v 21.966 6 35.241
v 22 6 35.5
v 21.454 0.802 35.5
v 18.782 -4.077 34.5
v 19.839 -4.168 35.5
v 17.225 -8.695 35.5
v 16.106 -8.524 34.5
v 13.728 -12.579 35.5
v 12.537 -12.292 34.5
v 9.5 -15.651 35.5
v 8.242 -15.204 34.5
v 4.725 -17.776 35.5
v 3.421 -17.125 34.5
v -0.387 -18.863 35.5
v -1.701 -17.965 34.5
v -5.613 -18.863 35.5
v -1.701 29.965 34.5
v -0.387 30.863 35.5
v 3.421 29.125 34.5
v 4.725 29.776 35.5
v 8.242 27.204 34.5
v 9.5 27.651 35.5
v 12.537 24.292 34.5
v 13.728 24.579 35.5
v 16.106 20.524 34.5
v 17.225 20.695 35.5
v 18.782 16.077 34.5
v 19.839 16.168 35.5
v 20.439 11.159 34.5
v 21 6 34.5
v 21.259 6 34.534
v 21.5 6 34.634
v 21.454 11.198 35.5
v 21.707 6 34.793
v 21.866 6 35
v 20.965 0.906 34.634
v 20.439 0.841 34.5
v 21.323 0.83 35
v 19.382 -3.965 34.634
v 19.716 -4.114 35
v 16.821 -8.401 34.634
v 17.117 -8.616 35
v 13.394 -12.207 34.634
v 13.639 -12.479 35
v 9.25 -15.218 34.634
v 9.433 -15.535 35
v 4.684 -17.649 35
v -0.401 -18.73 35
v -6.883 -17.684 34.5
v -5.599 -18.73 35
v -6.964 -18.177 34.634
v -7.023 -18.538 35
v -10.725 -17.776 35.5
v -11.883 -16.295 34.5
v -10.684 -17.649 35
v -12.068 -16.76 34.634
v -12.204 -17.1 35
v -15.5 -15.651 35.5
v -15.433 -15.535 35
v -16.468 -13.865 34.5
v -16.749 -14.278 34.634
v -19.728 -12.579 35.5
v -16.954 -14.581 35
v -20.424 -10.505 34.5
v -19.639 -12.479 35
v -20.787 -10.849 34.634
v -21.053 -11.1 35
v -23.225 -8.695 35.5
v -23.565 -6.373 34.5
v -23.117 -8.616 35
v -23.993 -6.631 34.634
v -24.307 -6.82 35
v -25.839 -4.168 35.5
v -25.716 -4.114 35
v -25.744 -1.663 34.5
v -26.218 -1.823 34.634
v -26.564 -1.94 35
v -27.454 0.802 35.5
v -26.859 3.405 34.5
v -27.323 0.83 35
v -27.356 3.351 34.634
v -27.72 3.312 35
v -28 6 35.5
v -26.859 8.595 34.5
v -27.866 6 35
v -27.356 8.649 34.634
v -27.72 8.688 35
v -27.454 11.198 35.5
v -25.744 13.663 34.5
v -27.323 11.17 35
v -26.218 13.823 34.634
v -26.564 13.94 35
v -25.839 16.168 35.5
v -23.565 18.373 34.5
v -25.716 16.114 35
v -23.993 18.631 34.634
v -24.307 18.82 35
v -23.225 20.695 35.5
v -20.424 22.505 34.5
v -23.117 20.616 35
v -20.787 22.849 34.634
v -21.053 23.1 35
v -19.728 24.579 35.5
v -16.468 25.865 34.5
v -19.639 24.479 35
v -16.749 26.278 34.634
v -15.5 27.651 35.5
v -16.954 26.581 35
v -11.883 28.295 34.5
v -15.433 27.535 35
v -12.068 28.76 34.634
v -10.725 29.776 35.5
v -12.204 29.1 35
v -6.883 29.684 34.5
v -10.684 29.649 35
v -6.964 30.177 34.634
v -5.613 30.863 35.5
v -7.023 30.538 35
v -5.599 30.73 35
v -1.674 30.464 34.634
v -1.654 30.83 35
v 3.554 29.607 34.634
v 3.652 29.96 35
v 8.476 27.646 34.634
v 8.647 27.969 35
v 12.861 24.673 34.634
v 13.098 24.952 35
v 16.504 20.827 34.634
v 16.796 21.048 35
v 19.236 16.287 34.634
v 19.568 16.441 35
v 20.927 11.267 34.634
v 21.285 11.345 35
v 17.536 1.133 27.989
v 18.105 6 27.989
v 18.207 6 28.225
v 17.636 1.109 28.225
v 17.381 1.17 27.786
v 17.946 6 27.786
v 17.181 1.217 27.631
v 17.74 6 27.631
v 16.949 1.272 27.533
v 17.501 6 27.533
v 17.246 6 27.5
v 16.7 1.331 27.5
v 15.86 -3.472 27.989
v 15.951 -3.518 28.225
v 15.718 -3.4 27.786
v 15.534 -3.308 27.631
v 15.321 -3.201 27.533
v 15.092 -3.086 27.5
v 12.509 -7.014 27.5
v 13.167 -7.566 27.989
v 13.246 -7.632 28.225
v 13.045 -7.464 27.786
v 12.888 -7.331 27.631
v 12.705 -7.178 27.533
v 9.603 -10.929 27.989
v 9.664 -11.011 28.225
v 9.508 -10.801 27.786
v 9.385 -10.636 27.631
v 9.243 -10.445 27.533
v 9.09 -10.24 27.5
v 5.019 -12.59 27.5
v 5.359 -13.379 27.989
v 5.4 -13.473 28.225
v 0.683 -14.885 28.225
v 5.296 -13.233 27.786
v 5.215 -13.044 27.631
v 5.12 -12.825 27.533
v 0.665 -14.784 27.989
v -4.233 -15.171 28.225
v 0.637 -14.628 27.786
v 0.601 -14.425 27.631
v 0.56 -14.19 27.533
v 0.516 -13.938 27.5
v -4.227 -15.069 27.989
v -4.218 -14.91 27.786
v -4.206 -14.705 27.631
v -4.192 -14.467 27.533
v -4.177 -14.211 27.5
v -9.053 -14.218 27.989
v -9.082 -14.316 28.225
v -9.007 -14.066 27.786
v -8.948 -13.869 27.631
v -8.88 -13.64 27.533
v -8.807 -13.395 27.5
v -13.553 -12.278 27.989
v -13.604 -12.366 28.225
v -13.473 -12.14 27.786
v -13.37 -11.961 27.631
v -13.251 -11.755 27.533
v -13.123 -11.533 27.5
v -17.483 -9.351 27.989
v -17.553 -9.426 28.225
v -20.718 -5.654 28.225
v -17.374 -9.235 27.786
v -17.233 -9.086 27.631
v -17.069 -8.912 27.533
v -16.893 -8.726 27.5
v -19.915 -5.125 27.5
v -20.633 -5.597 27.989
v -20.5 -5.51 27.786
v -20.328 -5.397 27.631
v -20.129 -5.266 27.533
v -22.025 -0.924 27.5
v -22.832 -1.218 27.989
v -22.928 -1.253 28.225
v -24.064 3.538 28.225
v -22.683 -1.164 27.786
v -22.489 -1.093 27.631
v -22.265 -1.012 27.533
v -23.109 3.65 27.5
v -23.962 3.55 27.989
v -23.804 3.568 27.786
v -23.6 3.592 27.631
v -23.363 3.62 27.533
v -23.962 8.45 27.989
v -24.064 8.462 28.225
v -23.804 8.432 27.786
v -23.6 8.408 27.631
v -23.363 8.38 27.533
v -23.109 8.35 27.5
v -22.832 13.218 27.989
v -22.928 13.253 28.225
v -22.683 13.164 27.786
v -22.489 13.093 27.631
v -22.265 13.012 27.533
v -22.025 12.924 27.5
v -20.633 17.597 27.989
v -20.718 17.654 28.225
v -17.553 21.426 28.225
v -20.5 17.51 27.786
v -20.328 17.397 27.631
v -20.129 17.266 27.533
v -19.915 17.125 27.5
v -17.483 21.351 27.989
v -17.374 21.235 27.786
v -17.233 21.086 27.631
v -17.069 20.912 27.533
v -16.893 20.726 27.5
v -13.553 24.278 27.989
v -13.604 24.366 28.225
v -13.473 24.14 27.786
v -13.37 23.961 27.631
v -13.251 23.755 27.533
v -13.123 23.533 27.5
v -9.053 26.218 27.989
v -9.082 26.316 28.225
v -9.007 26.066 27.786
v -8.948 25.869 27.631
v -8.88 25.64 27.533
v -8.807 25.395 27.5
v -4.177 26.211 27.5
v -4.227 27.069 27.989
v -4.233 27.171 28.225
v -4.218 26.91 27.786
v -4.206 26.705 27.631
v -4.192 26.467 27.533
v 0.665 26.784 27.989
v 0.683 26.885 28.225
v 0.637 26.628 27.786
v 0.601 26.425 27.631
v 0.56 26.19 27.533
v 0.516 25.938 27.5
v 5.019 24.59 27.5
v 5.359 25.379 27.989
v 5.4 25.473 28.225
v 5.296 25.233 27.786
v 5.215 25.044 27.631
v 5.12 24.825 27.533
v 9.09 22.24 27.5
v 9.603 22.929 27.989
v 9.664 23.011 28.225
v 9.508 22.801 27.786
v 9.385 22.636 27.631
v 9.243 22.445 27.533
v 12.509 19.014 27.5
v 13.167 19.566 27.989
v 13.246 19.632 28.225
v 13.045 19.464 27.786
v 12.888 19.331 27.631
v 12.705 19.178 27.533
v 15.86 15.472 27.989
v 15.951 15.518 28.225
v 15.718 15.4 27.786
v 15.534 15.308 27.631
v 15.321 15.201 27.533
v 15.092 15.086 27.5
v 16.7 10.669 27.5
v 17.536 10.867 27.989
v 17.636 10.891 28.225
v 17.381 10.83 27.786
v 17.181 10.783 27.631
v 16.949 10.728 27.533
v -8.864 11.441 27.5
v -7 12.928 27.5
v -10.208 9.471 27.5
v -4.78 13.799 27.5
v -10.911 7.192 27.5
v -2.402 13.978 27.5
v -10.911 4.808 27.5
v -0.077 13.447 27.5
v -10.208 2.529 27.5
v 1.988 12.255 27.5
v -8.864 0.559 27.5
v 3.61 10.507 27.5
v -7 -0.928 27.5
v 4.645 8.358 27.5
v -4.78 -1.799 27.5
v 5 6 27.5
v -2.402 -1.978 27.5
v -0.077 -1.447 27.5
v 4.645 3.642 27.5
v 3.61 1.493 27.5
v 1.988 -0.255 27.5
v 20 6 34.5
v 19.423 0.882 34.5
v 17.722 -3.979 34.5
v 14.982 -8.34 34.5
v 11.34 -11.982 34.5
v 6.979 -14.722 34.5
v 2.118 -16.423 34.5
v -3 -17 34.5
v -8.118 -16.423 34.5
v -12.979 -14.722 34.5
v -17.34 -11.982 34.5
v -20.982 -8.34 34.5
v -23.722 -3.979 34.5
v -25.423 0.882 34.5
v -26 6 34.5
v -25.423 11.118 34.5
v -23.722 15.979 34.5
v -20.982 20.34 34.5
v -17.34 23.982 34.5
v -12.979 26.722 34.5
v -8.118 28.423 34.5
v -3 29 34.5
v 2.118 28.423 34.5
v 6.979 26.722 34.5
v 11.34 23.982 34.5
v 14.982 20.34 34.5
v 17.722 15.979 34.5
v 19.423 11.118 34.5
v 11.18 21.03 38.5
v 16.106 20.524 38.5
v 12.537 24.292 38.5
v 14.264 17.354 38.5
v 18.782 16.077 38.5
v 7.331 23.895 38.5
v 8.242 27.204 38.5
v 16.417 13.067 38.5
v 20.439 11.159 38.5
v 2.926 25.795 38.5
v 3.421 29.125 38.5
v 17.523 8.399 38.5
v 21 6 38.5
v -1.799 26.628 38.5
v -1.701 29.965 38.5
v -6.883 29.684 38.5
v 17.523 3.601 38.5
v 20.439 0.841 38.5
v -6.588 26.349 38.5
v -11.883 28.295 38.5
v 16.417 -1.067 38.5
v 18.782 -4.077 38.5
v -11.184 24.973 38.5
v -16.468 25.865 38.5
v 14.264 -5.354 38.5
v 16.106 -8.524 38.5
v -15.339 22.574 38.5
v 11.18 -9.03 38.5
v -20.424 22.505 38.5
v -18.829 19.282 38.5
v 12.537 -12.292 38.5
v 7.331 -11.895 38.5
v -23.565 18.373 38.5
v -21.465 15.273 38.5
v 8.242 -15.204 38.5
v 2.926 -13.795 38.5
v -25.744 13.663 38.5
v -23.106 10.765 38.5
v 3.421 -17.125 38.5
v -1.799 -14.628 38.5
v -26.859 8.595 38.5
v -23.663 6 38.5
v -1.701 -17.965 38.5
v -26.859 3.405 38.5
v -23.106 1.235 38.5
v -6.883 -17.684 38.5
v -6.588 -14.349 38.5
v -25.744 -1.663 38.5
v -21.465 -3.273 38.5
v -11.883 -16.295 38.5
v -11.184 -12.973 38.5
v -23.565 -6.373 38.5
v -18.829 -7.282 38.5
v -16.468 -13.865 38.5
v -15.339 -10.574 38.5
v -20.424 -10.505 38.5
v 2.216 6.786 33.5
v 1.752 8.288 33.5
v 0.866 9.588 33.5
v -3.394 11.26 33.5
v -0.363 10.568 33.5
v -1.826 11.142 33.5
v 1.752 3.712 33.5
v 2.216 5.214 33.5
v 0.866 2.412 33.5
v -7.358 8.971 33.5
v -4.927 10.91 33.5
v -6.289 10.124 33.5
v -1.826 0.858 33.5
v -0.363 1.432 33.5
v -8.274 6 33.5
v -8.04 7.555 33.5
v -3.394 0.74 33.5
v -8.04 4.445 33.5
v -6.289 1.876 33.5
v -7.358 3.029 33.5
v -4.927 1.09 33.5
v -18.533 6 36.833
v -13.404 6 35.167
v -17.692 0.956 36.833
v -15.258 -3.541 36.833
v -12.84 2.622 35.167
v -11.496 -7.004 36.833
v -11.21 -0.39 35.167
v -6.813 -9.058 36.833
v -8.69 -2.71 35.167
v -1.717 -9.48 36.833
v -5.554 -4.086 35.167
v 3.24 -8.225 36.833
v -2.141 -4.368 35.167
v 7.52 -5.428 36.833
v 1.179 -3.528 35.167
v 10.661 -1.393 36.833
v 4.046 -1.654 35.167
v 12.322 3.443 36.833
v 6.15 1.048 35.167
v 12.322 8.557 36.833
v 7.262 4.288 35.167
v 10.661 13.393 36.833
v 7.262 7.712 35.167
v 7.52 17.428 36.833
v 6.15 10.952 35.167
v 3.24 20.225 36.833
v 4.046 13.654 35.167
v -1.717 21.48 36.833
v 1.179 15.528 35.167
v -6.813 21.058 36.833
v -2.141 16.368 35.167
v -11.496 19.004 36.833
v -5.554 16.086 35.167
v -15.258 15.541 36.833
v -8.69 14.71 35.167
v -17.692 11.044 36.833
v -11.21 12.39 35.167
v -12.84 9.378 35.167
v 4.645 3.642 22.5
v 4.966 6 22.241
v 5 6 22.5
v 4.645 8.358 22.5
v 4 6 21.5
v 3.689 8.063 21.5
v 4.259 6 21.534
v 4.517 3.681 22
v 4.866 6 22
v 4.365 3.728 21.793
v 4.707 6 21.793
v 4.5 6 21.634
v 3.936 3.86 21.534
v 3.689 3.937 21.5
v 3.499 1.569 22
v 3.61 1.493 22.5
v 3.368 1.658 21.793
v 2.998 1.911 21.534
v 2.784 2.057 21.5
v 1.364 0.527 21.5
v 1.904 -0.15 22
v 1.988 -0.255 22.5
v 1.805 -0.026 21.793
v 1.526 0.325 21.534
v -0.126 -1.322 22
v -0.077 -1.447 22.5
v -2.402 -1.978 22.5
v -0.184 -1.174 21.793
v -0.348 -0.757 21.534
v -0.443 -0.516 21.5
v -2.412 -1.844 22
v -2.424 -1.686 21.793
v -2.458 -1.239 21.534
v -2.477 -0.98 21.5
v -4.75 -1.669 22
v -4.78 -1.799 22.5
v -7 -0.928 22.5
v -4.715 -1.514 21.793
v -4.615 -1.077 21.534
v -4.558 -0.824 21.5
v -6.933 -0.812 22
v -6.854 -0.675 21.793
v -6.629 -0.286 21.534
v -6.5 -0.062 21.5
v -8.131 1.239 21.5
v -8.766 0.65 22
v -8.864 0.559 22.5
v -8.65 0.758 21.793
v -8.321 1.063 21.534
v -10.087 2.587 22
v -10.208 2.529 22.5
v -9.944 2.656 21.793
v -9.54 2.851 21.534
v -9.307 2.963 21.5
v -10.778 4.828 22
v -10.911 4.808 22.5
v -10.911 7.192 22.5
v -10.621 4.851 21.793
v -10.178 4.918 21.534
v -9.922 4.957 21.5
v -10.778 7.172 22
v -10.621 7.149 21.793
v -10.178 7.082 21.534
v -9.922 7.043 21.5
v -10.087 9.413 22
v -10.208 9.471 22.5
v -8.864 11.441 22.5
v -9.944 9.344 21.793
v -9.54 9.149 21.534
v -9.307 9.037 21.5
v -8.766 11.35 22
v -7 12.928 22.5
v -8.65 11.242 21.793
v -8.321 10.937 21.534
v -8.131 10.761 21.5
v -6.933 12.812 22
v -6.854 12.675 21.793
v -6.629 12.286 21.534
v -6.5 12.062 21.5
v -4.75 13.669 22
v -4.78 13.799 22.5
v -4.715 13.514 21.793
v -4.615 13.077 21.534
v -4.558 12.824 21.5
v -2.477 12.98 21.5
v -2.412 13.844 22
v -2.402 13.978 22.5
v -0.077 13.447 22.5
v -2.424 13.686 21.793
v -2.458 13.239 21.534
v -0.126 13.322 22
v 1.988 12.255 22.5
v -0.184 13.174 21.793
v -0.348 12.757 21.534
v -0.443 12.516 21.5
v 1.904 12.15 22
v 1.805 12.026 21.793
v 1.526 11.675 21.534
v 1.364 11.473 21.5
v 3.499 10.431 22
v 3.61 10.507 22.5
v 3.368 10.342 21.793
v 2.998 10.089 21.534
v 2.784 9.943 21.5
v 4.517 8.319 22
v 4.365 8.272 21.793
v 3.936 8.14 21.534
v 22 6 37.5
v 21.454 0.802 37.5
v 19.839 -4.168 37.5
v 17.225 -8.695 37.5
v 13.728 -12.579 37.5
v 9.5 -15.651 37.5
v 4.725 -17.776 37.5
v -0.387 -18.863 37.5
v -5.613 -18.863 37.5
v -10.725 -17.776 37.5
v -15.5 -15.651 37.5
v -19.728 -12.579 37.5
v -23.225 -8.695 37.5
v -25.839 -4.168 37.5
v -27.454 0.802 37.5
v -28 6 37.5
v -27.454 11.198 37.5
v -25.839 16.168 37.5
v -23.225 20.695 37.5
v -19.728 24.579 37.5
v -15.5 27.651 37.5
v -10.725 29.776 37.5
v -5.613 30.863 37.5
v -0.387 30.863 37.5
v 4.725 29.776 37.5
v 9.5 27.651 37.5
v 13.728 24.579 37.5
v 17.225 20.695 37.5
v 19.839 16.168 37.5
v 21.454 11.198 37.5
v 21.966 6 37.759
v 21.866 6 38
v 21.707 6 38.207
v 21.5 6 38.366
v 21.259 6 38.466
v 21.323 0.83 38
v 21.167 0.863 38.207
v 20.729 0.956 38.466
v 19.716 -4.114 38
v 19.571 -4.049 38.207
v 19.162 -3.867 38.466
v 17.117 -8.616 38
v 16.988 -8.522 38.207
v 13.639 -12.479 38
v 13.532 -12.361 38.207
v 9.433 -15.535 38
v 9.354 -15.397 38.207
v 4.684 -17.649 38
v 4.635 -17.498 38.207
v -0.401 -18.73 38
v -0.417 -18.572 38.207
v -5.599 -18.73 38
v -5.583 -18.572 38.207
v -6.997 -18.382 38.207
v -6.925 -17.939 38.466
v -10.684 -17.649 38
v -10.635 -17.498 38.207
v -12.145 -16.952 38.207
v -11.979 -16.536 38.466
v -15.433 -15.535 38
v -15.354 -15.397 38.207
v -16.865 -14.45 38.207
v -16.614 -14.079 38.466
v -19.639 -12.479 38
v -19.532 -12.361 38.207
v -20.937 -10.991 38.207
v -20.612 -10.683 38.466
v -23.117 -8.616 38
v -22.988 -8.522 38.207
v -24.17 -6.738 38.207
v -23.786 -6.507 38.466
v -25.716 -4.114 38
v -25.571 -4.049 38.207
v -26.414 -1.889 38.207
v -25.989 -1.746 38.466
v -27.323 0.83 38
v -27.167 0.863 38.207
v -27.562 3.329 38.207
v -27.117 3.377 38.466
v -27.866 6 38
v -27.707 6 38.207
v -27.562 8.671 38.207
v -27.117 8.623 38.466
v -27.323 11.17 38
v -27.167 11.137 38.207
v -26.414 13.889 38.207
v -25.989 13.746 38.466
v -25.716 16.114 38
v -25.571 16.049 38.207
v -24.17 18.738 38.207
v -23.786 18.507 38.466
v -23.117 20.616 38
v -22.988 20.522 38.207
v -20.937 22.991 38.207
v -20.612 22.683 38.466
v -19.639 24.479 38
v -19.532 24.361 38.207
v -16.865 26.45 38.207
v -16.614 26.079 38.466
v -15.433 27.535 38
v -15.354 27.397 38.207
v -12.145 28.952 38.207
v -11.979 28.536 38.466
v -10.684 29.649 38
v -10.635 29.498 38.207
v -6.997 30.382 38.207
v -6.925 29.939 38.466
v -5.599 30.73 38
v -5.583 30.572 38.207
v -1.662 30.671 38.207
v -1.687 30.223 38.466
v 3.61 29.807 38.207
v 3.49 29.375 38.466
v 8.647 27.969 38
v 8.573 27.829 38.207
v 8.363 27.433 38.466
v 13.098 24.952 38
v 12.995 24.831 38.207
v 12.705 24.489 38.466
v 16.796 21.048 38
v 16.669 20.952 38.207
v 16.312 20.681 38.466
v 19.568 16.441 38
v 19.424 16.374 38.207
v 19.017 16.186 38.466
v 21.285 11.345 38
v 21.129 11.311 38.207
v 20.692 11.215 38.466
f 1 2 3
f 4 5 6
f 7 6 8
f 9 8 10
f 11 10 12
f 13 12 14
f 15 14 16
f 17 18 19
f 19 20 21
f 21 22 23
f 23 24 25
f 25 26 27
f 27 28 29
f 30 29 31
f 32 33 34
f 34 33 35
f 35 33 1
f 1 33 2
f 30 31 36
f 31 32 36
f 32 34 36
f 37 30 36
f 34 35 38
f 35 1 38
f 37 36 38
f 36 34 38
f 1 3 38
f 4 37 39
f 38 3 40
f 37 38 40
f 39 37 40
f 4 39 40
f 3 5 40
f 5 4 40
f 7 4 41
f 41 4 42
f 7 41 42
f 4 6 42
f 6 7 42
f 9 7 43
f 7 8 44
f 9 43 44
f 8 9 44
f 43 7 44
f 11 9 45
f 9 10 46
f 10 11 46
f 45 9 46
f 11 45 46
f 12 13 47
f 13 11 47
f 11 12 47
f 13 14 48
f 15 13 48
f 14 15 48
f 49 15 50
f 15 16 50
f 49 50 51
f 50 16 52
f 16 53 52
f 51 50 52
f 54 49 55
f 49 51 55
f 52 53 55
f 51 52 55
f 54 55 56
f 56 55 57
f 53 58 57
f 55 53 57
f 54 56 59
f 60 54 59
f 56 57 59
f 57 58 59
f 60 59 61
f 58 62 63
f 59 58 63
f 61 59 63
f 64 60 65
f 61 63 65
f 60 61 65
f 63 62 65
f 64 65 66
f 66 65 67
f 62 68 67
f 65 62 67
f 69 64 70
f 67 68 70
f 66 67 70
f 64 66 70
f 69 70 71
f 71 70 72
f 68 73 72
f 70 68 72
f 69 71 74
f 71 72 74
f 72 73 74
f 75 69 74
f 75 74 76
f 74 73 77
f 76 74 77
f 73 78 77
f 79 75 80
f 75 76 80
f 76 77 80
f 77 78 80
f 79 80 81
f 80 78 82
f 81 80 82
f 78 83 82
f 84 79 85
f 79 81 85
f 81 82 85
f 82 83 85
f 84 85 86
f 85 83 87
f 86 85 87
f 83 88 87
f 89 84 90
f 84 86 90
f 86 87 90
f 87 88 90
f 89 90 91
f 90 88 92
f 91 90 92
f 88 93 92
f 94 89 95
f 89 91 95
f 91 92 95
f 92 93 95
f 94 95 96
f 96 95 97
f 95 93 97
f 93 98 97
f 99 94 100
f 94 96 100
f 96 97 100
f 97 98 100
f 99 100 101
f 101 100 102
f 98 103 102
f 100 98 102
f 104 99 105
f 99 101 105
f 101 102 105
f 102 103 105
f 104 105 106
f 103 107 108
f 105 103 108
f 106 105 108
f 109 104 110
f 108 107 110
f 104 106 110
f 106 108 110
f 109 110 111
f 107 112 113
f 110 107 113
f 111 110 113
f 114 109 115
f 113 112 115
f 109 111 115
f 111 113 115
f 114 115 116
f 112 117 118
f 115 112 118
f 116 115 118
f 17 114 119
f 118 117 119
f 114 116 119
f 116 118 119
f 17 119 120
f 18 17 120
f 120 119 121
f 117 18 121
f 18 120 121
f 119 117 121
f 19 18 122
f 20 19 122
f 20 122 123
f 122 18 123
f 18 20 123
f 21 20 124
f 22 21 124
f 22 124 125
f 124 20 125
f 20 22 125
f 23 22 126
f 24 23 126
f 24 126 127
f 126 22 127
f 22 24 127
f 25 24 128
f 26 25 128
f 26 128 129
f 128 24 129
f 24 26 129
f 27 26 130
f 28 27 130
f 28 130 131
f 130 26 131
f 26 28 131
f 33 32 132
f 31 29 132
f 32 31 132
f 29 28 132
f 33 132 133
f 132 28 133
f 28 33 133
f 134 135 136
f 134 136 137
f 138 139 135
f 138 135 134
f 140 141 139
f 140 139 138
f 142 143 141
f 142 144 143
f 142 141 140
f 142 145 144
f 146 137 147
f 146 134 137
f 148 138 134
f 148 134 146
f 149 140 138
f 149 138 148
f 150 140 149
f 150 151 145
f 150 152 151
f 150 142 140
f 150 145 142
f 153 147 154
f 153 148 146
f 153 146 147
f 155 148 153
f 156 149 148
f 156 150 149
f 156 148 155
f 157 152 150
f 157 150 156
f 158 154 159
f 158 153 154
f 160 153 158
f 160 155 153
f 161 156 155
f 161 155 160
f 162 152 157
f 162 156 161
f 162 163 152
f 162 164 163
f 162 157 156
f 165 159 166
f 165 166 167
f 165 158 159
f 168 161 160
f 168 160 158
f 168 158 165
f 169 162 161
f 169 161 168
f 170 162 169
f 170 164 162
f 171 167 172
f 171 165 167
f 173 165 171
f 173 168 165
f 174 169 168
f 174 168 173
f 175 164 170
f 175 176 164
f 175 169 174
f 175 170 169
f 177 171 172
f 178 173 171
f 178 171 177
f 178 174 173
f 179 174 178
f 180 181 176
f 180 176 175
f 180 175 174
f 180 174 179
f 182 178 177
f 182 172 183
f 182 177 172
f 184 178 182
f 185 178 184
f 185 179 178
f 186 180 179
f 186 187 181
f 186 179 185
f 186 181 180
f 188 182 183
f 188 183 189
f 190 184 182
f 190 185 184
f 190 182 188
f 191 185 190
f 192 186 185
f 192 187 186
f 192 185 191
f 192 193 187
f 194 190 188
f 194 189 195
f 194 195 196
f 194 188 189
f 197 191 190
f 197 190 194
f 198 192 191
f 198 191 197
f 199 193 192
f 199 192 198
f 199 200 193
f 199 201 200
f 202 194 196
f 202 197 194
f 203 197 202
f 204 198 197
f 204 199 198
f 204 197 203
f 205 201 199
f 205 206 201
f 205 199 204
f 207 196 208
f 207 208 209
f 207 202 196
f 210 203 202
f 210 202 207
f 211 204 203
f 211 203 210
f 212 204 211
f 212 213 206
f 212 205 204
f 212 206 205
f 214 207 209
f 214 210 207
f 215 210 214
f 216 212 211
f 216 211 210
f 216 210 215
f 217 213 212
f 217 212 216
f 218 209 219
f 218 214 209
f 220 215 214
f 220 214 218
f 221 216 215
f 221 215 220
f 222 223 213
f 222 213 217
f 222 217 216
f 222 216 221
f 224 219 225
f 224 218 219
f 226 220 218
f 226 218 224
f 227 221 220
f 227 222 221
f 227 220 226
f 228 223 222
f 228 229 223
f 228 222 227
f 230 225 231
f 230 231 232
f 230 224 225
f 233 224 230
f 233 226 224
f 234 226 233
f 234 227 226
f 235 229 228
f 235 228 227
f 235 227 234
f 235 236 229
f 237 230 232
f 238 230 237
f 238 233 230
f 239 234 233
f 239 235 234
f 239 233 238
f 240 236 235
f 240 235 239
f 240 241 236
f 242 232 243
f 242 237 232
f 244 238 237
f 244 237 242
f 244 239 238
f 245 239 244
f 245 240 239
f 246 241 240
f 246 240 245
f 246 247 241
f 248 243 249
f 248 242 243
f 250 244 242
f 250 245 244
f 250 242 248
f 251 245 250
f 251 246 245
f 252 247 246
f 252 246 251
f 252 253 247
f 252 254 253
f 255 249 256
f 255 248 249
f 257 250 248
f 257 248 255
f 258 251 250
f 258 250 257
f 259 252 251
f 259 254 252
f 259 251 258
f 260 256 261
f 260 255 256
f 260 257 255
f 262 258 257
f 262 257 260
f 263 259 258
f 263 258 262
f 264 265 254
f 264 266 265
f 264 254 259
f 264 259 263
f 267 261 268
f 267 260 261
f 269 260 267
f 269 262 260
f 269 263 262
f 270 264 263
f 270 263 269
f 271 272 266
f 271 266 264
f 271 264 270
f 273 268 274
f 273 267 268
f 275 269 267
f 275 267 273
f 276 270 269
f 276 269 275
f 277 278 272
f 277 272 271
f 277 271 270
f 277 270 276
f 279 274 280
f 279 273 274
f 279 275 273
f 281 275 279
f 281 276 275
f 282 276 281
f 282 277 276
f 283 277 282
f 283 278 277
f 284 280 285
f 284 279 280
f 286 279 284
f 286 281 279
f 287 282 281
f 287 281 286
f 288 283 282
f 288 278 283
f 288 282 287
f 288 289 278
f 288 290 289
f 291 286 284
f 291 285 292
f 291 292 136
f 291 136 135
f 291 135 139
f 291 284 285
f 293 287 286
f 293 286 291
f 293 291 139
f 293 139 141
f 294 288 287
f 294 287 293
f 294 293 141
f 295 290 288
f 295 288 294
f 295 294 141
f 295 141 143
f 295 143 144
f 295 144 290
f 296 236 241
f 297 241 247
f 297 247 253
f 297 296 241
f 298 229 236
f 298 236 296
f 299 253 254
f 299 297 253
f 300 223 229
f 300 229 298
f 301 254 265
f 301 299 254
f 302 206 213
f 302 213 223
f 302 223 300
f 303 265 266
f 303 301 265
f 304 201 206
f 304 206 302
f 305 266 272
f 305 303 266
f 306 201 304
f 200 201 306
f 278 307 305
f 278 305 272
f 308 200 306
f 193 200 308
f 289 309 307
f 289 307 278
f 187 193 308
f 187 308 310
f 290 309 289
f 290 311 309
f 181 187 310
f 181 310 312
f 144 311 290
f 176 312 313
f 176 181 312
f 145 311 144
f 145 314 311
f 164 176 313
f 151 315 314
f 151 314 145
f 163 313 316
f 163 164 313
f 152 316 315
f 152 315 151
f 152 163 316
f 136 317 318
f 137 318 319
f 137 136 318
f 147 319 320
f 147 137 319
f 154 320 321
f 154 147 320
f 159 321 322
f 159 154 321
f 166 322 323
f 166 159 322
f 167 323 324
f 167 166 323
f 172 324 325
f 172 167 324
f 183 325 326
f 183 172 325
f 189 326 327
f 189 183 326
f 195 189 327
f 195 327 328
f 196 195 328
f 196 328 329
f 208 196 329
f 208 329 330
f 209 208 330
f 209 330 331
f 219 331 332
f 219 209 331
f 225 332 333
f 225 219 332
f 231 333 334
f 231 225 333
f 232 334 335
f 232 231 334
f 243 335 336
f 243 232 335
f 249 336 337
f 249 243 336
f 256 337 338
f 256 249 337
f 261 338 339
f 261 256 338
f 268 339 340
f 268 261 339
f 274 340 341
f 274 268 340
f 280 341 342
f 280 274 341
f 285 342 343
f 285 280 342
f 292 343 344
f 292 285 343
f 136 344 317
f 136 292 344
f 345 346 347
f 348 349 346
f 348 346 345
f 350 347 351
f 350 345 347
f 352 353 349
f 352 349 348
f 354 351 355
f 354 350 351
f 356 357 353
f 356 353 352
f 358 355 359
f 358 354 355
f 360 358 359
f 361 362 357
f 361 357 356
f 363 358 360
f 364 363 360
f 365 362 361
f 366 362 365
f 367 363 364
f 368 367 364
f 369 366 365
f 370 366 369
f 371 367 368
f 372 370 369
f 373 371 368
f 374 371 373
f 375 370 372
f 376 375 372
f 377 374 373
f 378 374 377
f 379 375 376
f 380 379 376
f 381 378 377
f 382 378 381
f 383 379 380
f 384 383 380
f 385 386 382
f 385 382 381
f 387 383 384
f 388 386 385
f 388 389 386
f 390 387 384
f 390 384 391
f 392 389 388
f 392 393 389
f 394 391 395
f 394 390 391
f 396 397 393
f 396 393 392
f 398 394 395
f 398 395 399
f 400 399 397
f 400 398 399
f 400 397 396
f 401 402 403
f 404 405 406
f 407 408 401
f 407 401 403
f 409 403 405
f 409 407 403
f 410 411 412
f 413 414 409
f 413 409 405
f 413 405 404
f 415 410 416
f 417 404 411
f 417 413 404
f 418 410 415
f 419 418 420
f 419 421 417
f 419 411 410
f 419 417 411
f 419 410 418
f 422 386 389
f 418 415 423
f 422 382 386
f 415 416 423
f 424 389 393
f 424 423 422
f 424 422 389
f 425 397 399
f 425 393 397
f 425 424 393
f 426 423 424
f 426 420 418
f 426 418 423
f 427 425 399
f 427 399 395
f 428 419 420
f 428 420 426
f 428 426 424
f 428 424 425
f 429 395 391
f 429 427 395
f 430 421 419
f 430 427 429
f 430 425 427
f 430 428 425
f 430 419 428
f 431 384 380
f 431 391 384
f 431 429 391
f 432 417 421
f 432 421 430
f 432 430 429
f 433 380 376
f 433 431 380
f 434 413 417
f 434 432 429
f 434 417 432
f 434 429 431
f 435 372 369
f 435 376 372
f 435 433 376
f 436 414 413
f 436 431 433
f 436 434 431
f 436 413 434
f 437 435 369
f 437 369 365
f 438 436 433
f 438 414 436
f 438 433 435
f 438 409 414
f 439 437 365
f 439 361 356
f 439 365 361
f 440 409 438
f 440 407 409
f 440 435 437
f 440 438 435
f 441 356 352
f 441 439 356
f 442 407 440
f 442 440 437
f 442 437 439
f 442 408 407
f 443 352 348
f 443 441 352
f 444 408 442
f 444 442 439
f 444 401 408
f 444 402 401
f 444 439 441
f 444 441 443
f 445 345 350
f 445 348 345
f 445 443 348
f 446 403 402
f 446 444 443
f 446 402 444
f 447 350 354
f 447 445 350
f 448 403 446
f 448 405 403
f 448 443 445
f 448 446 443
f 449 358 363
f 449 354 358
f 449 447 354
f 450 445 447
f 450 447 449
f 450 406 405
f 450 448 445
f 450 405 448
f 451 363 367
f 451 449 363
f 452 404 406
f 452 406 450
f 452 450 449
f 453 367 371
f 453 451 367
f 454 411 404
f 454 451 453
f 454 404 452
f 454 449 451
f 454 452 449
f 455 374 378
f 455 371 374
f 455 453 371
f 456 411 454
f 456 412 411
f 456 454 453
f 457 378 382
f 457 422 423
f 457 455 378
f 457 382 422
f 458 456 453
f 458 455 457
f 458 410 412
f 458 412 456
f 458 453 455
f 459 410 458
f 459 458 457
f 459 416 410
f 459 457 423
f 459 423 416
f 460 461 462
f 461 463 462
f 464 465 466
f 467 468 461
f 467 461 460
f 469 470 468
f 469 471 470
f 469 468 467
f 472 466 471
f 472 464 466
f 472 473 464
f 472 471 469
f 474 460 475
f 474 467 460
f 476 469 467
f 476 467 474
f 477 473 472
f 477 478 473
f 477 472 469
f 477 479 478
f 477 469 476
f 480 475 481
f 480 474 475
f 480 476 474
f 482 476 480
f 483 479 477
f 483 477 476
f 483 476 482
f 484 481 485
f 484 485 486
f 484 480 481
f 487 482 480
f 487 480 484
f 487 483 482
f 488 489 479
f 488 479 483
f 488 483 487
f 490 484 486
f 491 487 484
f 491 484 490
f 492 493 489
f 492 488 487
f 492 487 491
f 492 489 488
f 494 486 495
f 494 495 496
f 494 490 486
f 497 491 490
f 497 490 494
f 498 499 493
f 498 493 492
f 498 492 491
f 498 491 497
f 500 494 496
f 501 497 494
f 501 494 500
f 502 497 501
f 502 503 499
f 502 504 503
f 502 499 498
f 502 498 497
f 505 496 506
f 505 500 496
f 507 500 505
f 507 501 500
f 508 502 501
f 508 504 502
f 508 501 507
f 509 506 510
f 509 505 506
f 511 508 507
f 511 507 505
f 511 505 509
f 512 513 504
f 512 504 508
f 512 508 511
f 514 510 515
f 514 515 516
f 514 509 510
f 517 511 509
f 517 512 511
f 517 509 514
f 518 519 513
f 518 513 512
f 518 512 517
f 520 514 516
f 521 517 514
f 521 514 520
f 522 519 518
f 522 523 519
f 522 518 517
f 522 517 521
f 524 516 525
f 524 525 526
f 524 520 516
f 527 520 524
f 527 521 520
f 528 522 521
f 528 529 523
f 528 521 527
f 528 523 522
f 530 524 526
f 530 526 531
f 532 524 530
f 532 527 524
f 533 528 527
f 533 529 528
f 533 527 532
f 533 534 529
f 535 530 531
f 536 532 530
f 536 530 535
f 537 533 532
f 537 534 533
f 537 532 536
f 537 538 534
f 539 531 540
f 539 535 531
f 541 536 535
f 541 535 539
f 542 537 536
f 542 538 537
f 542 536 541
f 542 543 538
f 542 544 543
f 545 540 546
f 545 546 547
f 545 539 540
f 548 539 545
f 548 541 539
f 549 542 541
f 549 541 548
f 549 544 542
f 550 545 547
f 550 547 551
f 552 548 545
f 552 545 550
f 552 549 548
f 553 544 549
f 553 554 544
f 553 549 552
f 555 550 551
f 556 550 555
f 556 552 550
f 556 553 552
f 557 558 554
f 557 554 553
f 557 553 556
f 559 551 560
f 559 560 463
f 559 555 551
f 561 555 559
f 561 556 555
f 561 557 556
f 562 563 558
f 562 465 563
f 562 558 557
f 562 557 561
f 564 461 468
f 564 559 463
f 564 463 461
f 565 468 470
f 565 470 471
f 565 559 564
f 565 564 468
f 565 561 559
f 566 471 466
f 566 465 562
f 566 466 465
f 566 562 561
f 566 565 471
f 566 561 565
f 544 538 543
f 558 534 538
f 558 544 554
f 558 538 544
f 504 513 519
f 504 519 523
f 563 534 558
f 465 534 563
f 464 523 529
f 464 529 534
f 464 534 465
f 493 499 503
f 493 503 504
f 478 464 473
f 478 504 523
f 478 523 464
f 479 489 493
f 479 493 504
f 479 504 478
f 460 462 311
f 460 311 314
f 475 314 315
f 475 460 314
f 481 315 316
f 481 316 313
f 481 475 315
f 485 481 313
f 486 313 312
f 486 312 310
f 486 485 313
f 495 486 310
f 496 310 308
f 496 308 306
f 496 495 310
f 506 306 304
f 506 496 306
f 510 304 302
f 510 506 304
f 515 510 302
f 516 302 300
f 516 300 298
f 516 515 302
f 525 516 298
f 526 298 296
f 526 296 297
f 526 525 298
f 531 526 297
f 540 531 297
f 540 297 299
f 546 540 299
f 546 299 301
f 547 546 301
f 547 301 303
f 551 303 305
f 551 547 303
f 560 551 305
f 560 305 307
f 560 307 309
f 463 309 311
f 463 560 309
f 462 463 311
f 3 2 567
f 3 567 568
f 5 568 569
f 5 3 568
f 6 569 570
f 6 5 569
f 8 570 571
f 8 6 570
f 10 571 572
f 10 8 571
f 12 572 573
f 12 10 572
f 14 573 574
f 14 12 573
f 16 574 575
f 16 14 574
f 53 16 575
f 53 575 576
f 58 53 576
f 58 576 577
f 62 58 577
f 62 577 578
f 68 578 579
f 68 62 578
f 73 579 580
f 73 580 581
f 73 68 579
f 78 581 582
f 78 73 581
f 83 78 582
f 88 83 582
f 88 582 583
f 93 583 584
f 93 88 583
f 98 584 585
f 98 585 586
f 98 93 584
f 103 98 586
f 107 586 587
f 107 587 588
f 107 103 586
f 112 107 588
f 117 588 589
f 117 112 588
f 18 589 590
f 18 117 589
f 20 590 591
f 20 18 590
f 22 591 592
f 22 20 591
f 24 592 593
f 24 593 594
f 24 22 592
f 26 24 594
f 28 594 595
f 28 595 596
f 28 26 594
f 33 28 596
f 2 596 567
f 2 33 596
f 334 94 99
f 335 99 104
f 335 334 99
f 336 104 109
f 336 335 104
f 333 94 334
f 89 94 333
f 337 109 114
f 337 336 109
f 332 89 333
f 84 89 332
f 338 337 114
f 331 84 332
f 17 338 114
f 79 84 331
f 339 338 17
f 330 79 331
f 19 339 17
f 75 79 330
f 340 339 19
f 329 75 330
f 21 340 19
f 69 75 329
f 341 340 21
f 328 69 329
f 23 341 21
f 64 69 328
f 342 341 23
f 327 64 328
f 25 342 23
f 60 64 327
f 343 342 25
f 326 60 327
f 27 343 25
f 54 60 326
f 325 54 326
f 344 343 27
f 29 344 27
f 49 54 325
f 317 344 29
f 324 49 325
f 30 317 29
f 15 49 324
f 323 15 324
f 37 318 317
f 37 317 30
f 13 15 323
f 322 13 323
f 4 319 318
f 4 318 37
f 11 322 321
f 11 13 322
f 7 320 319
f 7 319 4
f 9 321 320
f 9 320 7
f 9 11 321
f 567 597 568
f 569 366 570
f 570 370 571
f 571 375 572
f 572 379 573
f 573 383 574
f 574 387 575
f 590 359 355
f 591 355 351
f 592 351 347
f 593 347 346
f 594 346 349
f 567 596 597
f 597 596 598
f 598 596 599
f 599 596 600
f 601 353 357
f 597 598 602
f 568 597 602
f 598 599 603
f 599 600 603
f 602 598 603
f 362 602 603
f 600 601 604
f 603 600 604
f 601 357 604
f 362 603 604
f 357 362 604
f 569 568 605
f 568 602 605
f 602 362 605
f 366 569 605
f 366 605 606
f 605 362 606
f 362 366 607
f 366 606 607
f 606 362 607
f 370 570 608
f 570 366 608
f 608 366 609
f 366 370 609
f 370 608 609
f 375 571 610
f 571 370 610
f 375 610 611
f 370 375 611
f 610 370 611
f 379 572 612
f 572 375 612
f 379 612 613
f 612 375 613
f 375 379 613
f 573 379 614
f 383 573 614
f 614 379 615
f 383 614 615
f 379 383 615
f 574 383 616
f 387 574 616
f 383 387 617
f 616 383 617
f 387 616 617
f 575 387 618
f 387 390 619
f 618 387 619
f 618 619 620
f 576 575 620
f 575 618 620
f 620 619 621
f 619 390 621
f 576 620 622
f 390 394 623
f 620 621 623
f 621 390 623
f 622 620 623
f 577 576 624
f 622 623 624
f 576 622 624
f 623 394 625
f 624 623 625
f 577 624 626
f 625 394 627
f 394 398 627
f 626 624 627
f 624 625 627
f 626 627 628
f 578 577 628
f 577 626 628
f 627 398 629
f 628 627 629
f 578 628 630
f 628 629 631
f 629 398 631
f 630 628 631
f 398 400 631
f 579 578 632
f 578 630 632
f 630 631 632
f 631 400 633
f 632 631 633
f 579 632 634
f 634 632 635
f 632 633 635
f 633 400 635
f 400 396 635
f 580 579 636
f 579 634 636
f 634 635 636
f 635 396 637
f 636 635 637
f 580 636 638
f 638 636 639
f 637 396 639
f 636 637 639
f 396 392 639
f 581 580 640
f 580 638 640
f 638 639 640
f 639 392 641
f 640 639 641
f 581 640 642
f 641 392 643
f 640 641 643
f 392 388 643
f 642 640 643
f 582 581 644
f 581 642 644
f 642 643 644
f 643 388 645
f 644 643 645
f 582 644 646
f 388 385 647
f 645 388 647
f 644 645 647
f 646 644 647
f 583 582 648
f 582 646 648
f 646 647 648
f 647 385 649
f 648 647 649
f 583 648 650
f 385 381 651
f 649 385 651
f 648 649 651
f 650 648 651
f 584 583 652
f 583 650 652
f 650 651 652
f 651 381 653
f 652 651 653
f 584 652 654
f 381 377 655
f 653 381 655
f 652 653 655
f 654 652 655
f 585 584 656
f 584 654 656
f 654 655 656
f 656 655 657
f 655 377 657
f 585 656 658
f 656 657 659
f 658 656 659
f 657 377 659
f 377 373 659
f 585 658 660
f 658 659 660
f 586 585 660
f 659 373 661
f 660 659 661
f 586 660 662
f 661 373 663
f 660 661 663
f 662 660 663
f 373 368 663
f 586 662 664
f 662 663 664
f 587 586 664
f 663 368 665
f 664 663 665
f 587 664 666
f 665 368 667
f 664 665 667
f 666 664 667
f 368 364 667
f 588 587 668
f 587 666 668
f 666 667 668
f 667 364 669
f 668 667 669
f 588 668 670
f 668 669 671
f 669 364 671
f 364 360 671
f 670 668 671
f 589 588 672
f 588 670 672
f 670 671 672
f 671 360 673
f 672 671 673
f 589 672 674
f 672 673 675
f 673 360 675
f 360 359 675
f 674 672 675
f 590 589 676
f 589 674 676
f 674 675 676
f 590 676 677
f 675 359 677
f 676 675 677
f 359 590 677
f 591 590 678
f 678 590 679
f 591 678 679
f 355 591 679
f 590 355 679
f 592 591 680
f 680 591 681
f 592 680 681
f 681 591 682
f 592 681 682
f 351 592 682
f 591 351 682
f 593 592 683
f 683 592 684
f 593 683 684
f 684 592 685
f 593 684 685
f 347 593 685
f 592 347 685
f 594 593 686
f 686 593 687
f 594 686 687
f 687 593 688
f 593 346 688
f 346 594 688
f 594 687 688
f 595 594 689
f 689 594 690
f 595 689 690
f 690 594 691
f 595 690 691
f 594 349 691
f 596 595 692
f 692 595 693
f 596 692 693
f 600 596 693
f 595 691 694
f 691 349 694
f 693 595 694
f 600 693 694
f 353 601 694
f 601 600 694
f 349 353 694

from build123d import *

# Parameters (mm, degrees)
FILLET017_R             = 1
FILLET018_R             = 1
SKETCH014_R             = 20.66285
POCKET_DEPTH            = 5
POCKET_TAPER            = 72
FILLET019_R             = 1
BODY014_PLACEMENT_ANGLE = 180


with BuildPart() as part:
    # Sketch013 → Revolve (revolve)
    with BuildSketch(Plane.XZ):
        Polygon((0, 0), (-25, 0), (-25, 4), (-23, 4), (-21, 11), (-8, 11), (-8, 17), (0, 17), align=None)
    revolve(axis=Axis((0, 0, 0), (0, 0, 1)))

    # Fillet017
    fillet017_edges = [part.edges().sort_by_distance(p)[0] for p in [
        (21, 0, 11),
        (8, 0, 17),
    ]]
    fillet(fillet017_edges, radius=FILLET017_R)

    # Fillet018
    fillet018_edges = [part.edges().sort_by_distance(p)[0] for p in [
        (25, 0, 4),
    ]]
    fillet(fillet018_edges, radius=FILLET018_R)

    # Sketch014 (on Face6 of BaseFeature002) → Pocket (cut)
    with BuildSketch(Plane(origin=(0, 0, 0), x_dir=(1, 0, 0), z_dir=(0, 0, -1))):
        Circle(SKETCH014_R)
    extrude(amount=-POCKET_DEPTH, taper=POCKET_TAPER, mode=Mode.SUBTRACT)

    # Fillet019
    fillet019_edges = [part.edges().sort_by_distance(p)[0] for p in [
        (25, 0, 0),
    ]]
    fillet(fillet019_edges, radius=FILLET019_R)


with BuildPart() as part_1:
    # Body014 placement: moved
    add(part.part.moved(Location((-3, 6, 38.5))).rotate(Axis((-3, 6, 38.5), (0, 1, 0)), BODY014_PLACEMENT_ANGLE))


solid = part_1.part
